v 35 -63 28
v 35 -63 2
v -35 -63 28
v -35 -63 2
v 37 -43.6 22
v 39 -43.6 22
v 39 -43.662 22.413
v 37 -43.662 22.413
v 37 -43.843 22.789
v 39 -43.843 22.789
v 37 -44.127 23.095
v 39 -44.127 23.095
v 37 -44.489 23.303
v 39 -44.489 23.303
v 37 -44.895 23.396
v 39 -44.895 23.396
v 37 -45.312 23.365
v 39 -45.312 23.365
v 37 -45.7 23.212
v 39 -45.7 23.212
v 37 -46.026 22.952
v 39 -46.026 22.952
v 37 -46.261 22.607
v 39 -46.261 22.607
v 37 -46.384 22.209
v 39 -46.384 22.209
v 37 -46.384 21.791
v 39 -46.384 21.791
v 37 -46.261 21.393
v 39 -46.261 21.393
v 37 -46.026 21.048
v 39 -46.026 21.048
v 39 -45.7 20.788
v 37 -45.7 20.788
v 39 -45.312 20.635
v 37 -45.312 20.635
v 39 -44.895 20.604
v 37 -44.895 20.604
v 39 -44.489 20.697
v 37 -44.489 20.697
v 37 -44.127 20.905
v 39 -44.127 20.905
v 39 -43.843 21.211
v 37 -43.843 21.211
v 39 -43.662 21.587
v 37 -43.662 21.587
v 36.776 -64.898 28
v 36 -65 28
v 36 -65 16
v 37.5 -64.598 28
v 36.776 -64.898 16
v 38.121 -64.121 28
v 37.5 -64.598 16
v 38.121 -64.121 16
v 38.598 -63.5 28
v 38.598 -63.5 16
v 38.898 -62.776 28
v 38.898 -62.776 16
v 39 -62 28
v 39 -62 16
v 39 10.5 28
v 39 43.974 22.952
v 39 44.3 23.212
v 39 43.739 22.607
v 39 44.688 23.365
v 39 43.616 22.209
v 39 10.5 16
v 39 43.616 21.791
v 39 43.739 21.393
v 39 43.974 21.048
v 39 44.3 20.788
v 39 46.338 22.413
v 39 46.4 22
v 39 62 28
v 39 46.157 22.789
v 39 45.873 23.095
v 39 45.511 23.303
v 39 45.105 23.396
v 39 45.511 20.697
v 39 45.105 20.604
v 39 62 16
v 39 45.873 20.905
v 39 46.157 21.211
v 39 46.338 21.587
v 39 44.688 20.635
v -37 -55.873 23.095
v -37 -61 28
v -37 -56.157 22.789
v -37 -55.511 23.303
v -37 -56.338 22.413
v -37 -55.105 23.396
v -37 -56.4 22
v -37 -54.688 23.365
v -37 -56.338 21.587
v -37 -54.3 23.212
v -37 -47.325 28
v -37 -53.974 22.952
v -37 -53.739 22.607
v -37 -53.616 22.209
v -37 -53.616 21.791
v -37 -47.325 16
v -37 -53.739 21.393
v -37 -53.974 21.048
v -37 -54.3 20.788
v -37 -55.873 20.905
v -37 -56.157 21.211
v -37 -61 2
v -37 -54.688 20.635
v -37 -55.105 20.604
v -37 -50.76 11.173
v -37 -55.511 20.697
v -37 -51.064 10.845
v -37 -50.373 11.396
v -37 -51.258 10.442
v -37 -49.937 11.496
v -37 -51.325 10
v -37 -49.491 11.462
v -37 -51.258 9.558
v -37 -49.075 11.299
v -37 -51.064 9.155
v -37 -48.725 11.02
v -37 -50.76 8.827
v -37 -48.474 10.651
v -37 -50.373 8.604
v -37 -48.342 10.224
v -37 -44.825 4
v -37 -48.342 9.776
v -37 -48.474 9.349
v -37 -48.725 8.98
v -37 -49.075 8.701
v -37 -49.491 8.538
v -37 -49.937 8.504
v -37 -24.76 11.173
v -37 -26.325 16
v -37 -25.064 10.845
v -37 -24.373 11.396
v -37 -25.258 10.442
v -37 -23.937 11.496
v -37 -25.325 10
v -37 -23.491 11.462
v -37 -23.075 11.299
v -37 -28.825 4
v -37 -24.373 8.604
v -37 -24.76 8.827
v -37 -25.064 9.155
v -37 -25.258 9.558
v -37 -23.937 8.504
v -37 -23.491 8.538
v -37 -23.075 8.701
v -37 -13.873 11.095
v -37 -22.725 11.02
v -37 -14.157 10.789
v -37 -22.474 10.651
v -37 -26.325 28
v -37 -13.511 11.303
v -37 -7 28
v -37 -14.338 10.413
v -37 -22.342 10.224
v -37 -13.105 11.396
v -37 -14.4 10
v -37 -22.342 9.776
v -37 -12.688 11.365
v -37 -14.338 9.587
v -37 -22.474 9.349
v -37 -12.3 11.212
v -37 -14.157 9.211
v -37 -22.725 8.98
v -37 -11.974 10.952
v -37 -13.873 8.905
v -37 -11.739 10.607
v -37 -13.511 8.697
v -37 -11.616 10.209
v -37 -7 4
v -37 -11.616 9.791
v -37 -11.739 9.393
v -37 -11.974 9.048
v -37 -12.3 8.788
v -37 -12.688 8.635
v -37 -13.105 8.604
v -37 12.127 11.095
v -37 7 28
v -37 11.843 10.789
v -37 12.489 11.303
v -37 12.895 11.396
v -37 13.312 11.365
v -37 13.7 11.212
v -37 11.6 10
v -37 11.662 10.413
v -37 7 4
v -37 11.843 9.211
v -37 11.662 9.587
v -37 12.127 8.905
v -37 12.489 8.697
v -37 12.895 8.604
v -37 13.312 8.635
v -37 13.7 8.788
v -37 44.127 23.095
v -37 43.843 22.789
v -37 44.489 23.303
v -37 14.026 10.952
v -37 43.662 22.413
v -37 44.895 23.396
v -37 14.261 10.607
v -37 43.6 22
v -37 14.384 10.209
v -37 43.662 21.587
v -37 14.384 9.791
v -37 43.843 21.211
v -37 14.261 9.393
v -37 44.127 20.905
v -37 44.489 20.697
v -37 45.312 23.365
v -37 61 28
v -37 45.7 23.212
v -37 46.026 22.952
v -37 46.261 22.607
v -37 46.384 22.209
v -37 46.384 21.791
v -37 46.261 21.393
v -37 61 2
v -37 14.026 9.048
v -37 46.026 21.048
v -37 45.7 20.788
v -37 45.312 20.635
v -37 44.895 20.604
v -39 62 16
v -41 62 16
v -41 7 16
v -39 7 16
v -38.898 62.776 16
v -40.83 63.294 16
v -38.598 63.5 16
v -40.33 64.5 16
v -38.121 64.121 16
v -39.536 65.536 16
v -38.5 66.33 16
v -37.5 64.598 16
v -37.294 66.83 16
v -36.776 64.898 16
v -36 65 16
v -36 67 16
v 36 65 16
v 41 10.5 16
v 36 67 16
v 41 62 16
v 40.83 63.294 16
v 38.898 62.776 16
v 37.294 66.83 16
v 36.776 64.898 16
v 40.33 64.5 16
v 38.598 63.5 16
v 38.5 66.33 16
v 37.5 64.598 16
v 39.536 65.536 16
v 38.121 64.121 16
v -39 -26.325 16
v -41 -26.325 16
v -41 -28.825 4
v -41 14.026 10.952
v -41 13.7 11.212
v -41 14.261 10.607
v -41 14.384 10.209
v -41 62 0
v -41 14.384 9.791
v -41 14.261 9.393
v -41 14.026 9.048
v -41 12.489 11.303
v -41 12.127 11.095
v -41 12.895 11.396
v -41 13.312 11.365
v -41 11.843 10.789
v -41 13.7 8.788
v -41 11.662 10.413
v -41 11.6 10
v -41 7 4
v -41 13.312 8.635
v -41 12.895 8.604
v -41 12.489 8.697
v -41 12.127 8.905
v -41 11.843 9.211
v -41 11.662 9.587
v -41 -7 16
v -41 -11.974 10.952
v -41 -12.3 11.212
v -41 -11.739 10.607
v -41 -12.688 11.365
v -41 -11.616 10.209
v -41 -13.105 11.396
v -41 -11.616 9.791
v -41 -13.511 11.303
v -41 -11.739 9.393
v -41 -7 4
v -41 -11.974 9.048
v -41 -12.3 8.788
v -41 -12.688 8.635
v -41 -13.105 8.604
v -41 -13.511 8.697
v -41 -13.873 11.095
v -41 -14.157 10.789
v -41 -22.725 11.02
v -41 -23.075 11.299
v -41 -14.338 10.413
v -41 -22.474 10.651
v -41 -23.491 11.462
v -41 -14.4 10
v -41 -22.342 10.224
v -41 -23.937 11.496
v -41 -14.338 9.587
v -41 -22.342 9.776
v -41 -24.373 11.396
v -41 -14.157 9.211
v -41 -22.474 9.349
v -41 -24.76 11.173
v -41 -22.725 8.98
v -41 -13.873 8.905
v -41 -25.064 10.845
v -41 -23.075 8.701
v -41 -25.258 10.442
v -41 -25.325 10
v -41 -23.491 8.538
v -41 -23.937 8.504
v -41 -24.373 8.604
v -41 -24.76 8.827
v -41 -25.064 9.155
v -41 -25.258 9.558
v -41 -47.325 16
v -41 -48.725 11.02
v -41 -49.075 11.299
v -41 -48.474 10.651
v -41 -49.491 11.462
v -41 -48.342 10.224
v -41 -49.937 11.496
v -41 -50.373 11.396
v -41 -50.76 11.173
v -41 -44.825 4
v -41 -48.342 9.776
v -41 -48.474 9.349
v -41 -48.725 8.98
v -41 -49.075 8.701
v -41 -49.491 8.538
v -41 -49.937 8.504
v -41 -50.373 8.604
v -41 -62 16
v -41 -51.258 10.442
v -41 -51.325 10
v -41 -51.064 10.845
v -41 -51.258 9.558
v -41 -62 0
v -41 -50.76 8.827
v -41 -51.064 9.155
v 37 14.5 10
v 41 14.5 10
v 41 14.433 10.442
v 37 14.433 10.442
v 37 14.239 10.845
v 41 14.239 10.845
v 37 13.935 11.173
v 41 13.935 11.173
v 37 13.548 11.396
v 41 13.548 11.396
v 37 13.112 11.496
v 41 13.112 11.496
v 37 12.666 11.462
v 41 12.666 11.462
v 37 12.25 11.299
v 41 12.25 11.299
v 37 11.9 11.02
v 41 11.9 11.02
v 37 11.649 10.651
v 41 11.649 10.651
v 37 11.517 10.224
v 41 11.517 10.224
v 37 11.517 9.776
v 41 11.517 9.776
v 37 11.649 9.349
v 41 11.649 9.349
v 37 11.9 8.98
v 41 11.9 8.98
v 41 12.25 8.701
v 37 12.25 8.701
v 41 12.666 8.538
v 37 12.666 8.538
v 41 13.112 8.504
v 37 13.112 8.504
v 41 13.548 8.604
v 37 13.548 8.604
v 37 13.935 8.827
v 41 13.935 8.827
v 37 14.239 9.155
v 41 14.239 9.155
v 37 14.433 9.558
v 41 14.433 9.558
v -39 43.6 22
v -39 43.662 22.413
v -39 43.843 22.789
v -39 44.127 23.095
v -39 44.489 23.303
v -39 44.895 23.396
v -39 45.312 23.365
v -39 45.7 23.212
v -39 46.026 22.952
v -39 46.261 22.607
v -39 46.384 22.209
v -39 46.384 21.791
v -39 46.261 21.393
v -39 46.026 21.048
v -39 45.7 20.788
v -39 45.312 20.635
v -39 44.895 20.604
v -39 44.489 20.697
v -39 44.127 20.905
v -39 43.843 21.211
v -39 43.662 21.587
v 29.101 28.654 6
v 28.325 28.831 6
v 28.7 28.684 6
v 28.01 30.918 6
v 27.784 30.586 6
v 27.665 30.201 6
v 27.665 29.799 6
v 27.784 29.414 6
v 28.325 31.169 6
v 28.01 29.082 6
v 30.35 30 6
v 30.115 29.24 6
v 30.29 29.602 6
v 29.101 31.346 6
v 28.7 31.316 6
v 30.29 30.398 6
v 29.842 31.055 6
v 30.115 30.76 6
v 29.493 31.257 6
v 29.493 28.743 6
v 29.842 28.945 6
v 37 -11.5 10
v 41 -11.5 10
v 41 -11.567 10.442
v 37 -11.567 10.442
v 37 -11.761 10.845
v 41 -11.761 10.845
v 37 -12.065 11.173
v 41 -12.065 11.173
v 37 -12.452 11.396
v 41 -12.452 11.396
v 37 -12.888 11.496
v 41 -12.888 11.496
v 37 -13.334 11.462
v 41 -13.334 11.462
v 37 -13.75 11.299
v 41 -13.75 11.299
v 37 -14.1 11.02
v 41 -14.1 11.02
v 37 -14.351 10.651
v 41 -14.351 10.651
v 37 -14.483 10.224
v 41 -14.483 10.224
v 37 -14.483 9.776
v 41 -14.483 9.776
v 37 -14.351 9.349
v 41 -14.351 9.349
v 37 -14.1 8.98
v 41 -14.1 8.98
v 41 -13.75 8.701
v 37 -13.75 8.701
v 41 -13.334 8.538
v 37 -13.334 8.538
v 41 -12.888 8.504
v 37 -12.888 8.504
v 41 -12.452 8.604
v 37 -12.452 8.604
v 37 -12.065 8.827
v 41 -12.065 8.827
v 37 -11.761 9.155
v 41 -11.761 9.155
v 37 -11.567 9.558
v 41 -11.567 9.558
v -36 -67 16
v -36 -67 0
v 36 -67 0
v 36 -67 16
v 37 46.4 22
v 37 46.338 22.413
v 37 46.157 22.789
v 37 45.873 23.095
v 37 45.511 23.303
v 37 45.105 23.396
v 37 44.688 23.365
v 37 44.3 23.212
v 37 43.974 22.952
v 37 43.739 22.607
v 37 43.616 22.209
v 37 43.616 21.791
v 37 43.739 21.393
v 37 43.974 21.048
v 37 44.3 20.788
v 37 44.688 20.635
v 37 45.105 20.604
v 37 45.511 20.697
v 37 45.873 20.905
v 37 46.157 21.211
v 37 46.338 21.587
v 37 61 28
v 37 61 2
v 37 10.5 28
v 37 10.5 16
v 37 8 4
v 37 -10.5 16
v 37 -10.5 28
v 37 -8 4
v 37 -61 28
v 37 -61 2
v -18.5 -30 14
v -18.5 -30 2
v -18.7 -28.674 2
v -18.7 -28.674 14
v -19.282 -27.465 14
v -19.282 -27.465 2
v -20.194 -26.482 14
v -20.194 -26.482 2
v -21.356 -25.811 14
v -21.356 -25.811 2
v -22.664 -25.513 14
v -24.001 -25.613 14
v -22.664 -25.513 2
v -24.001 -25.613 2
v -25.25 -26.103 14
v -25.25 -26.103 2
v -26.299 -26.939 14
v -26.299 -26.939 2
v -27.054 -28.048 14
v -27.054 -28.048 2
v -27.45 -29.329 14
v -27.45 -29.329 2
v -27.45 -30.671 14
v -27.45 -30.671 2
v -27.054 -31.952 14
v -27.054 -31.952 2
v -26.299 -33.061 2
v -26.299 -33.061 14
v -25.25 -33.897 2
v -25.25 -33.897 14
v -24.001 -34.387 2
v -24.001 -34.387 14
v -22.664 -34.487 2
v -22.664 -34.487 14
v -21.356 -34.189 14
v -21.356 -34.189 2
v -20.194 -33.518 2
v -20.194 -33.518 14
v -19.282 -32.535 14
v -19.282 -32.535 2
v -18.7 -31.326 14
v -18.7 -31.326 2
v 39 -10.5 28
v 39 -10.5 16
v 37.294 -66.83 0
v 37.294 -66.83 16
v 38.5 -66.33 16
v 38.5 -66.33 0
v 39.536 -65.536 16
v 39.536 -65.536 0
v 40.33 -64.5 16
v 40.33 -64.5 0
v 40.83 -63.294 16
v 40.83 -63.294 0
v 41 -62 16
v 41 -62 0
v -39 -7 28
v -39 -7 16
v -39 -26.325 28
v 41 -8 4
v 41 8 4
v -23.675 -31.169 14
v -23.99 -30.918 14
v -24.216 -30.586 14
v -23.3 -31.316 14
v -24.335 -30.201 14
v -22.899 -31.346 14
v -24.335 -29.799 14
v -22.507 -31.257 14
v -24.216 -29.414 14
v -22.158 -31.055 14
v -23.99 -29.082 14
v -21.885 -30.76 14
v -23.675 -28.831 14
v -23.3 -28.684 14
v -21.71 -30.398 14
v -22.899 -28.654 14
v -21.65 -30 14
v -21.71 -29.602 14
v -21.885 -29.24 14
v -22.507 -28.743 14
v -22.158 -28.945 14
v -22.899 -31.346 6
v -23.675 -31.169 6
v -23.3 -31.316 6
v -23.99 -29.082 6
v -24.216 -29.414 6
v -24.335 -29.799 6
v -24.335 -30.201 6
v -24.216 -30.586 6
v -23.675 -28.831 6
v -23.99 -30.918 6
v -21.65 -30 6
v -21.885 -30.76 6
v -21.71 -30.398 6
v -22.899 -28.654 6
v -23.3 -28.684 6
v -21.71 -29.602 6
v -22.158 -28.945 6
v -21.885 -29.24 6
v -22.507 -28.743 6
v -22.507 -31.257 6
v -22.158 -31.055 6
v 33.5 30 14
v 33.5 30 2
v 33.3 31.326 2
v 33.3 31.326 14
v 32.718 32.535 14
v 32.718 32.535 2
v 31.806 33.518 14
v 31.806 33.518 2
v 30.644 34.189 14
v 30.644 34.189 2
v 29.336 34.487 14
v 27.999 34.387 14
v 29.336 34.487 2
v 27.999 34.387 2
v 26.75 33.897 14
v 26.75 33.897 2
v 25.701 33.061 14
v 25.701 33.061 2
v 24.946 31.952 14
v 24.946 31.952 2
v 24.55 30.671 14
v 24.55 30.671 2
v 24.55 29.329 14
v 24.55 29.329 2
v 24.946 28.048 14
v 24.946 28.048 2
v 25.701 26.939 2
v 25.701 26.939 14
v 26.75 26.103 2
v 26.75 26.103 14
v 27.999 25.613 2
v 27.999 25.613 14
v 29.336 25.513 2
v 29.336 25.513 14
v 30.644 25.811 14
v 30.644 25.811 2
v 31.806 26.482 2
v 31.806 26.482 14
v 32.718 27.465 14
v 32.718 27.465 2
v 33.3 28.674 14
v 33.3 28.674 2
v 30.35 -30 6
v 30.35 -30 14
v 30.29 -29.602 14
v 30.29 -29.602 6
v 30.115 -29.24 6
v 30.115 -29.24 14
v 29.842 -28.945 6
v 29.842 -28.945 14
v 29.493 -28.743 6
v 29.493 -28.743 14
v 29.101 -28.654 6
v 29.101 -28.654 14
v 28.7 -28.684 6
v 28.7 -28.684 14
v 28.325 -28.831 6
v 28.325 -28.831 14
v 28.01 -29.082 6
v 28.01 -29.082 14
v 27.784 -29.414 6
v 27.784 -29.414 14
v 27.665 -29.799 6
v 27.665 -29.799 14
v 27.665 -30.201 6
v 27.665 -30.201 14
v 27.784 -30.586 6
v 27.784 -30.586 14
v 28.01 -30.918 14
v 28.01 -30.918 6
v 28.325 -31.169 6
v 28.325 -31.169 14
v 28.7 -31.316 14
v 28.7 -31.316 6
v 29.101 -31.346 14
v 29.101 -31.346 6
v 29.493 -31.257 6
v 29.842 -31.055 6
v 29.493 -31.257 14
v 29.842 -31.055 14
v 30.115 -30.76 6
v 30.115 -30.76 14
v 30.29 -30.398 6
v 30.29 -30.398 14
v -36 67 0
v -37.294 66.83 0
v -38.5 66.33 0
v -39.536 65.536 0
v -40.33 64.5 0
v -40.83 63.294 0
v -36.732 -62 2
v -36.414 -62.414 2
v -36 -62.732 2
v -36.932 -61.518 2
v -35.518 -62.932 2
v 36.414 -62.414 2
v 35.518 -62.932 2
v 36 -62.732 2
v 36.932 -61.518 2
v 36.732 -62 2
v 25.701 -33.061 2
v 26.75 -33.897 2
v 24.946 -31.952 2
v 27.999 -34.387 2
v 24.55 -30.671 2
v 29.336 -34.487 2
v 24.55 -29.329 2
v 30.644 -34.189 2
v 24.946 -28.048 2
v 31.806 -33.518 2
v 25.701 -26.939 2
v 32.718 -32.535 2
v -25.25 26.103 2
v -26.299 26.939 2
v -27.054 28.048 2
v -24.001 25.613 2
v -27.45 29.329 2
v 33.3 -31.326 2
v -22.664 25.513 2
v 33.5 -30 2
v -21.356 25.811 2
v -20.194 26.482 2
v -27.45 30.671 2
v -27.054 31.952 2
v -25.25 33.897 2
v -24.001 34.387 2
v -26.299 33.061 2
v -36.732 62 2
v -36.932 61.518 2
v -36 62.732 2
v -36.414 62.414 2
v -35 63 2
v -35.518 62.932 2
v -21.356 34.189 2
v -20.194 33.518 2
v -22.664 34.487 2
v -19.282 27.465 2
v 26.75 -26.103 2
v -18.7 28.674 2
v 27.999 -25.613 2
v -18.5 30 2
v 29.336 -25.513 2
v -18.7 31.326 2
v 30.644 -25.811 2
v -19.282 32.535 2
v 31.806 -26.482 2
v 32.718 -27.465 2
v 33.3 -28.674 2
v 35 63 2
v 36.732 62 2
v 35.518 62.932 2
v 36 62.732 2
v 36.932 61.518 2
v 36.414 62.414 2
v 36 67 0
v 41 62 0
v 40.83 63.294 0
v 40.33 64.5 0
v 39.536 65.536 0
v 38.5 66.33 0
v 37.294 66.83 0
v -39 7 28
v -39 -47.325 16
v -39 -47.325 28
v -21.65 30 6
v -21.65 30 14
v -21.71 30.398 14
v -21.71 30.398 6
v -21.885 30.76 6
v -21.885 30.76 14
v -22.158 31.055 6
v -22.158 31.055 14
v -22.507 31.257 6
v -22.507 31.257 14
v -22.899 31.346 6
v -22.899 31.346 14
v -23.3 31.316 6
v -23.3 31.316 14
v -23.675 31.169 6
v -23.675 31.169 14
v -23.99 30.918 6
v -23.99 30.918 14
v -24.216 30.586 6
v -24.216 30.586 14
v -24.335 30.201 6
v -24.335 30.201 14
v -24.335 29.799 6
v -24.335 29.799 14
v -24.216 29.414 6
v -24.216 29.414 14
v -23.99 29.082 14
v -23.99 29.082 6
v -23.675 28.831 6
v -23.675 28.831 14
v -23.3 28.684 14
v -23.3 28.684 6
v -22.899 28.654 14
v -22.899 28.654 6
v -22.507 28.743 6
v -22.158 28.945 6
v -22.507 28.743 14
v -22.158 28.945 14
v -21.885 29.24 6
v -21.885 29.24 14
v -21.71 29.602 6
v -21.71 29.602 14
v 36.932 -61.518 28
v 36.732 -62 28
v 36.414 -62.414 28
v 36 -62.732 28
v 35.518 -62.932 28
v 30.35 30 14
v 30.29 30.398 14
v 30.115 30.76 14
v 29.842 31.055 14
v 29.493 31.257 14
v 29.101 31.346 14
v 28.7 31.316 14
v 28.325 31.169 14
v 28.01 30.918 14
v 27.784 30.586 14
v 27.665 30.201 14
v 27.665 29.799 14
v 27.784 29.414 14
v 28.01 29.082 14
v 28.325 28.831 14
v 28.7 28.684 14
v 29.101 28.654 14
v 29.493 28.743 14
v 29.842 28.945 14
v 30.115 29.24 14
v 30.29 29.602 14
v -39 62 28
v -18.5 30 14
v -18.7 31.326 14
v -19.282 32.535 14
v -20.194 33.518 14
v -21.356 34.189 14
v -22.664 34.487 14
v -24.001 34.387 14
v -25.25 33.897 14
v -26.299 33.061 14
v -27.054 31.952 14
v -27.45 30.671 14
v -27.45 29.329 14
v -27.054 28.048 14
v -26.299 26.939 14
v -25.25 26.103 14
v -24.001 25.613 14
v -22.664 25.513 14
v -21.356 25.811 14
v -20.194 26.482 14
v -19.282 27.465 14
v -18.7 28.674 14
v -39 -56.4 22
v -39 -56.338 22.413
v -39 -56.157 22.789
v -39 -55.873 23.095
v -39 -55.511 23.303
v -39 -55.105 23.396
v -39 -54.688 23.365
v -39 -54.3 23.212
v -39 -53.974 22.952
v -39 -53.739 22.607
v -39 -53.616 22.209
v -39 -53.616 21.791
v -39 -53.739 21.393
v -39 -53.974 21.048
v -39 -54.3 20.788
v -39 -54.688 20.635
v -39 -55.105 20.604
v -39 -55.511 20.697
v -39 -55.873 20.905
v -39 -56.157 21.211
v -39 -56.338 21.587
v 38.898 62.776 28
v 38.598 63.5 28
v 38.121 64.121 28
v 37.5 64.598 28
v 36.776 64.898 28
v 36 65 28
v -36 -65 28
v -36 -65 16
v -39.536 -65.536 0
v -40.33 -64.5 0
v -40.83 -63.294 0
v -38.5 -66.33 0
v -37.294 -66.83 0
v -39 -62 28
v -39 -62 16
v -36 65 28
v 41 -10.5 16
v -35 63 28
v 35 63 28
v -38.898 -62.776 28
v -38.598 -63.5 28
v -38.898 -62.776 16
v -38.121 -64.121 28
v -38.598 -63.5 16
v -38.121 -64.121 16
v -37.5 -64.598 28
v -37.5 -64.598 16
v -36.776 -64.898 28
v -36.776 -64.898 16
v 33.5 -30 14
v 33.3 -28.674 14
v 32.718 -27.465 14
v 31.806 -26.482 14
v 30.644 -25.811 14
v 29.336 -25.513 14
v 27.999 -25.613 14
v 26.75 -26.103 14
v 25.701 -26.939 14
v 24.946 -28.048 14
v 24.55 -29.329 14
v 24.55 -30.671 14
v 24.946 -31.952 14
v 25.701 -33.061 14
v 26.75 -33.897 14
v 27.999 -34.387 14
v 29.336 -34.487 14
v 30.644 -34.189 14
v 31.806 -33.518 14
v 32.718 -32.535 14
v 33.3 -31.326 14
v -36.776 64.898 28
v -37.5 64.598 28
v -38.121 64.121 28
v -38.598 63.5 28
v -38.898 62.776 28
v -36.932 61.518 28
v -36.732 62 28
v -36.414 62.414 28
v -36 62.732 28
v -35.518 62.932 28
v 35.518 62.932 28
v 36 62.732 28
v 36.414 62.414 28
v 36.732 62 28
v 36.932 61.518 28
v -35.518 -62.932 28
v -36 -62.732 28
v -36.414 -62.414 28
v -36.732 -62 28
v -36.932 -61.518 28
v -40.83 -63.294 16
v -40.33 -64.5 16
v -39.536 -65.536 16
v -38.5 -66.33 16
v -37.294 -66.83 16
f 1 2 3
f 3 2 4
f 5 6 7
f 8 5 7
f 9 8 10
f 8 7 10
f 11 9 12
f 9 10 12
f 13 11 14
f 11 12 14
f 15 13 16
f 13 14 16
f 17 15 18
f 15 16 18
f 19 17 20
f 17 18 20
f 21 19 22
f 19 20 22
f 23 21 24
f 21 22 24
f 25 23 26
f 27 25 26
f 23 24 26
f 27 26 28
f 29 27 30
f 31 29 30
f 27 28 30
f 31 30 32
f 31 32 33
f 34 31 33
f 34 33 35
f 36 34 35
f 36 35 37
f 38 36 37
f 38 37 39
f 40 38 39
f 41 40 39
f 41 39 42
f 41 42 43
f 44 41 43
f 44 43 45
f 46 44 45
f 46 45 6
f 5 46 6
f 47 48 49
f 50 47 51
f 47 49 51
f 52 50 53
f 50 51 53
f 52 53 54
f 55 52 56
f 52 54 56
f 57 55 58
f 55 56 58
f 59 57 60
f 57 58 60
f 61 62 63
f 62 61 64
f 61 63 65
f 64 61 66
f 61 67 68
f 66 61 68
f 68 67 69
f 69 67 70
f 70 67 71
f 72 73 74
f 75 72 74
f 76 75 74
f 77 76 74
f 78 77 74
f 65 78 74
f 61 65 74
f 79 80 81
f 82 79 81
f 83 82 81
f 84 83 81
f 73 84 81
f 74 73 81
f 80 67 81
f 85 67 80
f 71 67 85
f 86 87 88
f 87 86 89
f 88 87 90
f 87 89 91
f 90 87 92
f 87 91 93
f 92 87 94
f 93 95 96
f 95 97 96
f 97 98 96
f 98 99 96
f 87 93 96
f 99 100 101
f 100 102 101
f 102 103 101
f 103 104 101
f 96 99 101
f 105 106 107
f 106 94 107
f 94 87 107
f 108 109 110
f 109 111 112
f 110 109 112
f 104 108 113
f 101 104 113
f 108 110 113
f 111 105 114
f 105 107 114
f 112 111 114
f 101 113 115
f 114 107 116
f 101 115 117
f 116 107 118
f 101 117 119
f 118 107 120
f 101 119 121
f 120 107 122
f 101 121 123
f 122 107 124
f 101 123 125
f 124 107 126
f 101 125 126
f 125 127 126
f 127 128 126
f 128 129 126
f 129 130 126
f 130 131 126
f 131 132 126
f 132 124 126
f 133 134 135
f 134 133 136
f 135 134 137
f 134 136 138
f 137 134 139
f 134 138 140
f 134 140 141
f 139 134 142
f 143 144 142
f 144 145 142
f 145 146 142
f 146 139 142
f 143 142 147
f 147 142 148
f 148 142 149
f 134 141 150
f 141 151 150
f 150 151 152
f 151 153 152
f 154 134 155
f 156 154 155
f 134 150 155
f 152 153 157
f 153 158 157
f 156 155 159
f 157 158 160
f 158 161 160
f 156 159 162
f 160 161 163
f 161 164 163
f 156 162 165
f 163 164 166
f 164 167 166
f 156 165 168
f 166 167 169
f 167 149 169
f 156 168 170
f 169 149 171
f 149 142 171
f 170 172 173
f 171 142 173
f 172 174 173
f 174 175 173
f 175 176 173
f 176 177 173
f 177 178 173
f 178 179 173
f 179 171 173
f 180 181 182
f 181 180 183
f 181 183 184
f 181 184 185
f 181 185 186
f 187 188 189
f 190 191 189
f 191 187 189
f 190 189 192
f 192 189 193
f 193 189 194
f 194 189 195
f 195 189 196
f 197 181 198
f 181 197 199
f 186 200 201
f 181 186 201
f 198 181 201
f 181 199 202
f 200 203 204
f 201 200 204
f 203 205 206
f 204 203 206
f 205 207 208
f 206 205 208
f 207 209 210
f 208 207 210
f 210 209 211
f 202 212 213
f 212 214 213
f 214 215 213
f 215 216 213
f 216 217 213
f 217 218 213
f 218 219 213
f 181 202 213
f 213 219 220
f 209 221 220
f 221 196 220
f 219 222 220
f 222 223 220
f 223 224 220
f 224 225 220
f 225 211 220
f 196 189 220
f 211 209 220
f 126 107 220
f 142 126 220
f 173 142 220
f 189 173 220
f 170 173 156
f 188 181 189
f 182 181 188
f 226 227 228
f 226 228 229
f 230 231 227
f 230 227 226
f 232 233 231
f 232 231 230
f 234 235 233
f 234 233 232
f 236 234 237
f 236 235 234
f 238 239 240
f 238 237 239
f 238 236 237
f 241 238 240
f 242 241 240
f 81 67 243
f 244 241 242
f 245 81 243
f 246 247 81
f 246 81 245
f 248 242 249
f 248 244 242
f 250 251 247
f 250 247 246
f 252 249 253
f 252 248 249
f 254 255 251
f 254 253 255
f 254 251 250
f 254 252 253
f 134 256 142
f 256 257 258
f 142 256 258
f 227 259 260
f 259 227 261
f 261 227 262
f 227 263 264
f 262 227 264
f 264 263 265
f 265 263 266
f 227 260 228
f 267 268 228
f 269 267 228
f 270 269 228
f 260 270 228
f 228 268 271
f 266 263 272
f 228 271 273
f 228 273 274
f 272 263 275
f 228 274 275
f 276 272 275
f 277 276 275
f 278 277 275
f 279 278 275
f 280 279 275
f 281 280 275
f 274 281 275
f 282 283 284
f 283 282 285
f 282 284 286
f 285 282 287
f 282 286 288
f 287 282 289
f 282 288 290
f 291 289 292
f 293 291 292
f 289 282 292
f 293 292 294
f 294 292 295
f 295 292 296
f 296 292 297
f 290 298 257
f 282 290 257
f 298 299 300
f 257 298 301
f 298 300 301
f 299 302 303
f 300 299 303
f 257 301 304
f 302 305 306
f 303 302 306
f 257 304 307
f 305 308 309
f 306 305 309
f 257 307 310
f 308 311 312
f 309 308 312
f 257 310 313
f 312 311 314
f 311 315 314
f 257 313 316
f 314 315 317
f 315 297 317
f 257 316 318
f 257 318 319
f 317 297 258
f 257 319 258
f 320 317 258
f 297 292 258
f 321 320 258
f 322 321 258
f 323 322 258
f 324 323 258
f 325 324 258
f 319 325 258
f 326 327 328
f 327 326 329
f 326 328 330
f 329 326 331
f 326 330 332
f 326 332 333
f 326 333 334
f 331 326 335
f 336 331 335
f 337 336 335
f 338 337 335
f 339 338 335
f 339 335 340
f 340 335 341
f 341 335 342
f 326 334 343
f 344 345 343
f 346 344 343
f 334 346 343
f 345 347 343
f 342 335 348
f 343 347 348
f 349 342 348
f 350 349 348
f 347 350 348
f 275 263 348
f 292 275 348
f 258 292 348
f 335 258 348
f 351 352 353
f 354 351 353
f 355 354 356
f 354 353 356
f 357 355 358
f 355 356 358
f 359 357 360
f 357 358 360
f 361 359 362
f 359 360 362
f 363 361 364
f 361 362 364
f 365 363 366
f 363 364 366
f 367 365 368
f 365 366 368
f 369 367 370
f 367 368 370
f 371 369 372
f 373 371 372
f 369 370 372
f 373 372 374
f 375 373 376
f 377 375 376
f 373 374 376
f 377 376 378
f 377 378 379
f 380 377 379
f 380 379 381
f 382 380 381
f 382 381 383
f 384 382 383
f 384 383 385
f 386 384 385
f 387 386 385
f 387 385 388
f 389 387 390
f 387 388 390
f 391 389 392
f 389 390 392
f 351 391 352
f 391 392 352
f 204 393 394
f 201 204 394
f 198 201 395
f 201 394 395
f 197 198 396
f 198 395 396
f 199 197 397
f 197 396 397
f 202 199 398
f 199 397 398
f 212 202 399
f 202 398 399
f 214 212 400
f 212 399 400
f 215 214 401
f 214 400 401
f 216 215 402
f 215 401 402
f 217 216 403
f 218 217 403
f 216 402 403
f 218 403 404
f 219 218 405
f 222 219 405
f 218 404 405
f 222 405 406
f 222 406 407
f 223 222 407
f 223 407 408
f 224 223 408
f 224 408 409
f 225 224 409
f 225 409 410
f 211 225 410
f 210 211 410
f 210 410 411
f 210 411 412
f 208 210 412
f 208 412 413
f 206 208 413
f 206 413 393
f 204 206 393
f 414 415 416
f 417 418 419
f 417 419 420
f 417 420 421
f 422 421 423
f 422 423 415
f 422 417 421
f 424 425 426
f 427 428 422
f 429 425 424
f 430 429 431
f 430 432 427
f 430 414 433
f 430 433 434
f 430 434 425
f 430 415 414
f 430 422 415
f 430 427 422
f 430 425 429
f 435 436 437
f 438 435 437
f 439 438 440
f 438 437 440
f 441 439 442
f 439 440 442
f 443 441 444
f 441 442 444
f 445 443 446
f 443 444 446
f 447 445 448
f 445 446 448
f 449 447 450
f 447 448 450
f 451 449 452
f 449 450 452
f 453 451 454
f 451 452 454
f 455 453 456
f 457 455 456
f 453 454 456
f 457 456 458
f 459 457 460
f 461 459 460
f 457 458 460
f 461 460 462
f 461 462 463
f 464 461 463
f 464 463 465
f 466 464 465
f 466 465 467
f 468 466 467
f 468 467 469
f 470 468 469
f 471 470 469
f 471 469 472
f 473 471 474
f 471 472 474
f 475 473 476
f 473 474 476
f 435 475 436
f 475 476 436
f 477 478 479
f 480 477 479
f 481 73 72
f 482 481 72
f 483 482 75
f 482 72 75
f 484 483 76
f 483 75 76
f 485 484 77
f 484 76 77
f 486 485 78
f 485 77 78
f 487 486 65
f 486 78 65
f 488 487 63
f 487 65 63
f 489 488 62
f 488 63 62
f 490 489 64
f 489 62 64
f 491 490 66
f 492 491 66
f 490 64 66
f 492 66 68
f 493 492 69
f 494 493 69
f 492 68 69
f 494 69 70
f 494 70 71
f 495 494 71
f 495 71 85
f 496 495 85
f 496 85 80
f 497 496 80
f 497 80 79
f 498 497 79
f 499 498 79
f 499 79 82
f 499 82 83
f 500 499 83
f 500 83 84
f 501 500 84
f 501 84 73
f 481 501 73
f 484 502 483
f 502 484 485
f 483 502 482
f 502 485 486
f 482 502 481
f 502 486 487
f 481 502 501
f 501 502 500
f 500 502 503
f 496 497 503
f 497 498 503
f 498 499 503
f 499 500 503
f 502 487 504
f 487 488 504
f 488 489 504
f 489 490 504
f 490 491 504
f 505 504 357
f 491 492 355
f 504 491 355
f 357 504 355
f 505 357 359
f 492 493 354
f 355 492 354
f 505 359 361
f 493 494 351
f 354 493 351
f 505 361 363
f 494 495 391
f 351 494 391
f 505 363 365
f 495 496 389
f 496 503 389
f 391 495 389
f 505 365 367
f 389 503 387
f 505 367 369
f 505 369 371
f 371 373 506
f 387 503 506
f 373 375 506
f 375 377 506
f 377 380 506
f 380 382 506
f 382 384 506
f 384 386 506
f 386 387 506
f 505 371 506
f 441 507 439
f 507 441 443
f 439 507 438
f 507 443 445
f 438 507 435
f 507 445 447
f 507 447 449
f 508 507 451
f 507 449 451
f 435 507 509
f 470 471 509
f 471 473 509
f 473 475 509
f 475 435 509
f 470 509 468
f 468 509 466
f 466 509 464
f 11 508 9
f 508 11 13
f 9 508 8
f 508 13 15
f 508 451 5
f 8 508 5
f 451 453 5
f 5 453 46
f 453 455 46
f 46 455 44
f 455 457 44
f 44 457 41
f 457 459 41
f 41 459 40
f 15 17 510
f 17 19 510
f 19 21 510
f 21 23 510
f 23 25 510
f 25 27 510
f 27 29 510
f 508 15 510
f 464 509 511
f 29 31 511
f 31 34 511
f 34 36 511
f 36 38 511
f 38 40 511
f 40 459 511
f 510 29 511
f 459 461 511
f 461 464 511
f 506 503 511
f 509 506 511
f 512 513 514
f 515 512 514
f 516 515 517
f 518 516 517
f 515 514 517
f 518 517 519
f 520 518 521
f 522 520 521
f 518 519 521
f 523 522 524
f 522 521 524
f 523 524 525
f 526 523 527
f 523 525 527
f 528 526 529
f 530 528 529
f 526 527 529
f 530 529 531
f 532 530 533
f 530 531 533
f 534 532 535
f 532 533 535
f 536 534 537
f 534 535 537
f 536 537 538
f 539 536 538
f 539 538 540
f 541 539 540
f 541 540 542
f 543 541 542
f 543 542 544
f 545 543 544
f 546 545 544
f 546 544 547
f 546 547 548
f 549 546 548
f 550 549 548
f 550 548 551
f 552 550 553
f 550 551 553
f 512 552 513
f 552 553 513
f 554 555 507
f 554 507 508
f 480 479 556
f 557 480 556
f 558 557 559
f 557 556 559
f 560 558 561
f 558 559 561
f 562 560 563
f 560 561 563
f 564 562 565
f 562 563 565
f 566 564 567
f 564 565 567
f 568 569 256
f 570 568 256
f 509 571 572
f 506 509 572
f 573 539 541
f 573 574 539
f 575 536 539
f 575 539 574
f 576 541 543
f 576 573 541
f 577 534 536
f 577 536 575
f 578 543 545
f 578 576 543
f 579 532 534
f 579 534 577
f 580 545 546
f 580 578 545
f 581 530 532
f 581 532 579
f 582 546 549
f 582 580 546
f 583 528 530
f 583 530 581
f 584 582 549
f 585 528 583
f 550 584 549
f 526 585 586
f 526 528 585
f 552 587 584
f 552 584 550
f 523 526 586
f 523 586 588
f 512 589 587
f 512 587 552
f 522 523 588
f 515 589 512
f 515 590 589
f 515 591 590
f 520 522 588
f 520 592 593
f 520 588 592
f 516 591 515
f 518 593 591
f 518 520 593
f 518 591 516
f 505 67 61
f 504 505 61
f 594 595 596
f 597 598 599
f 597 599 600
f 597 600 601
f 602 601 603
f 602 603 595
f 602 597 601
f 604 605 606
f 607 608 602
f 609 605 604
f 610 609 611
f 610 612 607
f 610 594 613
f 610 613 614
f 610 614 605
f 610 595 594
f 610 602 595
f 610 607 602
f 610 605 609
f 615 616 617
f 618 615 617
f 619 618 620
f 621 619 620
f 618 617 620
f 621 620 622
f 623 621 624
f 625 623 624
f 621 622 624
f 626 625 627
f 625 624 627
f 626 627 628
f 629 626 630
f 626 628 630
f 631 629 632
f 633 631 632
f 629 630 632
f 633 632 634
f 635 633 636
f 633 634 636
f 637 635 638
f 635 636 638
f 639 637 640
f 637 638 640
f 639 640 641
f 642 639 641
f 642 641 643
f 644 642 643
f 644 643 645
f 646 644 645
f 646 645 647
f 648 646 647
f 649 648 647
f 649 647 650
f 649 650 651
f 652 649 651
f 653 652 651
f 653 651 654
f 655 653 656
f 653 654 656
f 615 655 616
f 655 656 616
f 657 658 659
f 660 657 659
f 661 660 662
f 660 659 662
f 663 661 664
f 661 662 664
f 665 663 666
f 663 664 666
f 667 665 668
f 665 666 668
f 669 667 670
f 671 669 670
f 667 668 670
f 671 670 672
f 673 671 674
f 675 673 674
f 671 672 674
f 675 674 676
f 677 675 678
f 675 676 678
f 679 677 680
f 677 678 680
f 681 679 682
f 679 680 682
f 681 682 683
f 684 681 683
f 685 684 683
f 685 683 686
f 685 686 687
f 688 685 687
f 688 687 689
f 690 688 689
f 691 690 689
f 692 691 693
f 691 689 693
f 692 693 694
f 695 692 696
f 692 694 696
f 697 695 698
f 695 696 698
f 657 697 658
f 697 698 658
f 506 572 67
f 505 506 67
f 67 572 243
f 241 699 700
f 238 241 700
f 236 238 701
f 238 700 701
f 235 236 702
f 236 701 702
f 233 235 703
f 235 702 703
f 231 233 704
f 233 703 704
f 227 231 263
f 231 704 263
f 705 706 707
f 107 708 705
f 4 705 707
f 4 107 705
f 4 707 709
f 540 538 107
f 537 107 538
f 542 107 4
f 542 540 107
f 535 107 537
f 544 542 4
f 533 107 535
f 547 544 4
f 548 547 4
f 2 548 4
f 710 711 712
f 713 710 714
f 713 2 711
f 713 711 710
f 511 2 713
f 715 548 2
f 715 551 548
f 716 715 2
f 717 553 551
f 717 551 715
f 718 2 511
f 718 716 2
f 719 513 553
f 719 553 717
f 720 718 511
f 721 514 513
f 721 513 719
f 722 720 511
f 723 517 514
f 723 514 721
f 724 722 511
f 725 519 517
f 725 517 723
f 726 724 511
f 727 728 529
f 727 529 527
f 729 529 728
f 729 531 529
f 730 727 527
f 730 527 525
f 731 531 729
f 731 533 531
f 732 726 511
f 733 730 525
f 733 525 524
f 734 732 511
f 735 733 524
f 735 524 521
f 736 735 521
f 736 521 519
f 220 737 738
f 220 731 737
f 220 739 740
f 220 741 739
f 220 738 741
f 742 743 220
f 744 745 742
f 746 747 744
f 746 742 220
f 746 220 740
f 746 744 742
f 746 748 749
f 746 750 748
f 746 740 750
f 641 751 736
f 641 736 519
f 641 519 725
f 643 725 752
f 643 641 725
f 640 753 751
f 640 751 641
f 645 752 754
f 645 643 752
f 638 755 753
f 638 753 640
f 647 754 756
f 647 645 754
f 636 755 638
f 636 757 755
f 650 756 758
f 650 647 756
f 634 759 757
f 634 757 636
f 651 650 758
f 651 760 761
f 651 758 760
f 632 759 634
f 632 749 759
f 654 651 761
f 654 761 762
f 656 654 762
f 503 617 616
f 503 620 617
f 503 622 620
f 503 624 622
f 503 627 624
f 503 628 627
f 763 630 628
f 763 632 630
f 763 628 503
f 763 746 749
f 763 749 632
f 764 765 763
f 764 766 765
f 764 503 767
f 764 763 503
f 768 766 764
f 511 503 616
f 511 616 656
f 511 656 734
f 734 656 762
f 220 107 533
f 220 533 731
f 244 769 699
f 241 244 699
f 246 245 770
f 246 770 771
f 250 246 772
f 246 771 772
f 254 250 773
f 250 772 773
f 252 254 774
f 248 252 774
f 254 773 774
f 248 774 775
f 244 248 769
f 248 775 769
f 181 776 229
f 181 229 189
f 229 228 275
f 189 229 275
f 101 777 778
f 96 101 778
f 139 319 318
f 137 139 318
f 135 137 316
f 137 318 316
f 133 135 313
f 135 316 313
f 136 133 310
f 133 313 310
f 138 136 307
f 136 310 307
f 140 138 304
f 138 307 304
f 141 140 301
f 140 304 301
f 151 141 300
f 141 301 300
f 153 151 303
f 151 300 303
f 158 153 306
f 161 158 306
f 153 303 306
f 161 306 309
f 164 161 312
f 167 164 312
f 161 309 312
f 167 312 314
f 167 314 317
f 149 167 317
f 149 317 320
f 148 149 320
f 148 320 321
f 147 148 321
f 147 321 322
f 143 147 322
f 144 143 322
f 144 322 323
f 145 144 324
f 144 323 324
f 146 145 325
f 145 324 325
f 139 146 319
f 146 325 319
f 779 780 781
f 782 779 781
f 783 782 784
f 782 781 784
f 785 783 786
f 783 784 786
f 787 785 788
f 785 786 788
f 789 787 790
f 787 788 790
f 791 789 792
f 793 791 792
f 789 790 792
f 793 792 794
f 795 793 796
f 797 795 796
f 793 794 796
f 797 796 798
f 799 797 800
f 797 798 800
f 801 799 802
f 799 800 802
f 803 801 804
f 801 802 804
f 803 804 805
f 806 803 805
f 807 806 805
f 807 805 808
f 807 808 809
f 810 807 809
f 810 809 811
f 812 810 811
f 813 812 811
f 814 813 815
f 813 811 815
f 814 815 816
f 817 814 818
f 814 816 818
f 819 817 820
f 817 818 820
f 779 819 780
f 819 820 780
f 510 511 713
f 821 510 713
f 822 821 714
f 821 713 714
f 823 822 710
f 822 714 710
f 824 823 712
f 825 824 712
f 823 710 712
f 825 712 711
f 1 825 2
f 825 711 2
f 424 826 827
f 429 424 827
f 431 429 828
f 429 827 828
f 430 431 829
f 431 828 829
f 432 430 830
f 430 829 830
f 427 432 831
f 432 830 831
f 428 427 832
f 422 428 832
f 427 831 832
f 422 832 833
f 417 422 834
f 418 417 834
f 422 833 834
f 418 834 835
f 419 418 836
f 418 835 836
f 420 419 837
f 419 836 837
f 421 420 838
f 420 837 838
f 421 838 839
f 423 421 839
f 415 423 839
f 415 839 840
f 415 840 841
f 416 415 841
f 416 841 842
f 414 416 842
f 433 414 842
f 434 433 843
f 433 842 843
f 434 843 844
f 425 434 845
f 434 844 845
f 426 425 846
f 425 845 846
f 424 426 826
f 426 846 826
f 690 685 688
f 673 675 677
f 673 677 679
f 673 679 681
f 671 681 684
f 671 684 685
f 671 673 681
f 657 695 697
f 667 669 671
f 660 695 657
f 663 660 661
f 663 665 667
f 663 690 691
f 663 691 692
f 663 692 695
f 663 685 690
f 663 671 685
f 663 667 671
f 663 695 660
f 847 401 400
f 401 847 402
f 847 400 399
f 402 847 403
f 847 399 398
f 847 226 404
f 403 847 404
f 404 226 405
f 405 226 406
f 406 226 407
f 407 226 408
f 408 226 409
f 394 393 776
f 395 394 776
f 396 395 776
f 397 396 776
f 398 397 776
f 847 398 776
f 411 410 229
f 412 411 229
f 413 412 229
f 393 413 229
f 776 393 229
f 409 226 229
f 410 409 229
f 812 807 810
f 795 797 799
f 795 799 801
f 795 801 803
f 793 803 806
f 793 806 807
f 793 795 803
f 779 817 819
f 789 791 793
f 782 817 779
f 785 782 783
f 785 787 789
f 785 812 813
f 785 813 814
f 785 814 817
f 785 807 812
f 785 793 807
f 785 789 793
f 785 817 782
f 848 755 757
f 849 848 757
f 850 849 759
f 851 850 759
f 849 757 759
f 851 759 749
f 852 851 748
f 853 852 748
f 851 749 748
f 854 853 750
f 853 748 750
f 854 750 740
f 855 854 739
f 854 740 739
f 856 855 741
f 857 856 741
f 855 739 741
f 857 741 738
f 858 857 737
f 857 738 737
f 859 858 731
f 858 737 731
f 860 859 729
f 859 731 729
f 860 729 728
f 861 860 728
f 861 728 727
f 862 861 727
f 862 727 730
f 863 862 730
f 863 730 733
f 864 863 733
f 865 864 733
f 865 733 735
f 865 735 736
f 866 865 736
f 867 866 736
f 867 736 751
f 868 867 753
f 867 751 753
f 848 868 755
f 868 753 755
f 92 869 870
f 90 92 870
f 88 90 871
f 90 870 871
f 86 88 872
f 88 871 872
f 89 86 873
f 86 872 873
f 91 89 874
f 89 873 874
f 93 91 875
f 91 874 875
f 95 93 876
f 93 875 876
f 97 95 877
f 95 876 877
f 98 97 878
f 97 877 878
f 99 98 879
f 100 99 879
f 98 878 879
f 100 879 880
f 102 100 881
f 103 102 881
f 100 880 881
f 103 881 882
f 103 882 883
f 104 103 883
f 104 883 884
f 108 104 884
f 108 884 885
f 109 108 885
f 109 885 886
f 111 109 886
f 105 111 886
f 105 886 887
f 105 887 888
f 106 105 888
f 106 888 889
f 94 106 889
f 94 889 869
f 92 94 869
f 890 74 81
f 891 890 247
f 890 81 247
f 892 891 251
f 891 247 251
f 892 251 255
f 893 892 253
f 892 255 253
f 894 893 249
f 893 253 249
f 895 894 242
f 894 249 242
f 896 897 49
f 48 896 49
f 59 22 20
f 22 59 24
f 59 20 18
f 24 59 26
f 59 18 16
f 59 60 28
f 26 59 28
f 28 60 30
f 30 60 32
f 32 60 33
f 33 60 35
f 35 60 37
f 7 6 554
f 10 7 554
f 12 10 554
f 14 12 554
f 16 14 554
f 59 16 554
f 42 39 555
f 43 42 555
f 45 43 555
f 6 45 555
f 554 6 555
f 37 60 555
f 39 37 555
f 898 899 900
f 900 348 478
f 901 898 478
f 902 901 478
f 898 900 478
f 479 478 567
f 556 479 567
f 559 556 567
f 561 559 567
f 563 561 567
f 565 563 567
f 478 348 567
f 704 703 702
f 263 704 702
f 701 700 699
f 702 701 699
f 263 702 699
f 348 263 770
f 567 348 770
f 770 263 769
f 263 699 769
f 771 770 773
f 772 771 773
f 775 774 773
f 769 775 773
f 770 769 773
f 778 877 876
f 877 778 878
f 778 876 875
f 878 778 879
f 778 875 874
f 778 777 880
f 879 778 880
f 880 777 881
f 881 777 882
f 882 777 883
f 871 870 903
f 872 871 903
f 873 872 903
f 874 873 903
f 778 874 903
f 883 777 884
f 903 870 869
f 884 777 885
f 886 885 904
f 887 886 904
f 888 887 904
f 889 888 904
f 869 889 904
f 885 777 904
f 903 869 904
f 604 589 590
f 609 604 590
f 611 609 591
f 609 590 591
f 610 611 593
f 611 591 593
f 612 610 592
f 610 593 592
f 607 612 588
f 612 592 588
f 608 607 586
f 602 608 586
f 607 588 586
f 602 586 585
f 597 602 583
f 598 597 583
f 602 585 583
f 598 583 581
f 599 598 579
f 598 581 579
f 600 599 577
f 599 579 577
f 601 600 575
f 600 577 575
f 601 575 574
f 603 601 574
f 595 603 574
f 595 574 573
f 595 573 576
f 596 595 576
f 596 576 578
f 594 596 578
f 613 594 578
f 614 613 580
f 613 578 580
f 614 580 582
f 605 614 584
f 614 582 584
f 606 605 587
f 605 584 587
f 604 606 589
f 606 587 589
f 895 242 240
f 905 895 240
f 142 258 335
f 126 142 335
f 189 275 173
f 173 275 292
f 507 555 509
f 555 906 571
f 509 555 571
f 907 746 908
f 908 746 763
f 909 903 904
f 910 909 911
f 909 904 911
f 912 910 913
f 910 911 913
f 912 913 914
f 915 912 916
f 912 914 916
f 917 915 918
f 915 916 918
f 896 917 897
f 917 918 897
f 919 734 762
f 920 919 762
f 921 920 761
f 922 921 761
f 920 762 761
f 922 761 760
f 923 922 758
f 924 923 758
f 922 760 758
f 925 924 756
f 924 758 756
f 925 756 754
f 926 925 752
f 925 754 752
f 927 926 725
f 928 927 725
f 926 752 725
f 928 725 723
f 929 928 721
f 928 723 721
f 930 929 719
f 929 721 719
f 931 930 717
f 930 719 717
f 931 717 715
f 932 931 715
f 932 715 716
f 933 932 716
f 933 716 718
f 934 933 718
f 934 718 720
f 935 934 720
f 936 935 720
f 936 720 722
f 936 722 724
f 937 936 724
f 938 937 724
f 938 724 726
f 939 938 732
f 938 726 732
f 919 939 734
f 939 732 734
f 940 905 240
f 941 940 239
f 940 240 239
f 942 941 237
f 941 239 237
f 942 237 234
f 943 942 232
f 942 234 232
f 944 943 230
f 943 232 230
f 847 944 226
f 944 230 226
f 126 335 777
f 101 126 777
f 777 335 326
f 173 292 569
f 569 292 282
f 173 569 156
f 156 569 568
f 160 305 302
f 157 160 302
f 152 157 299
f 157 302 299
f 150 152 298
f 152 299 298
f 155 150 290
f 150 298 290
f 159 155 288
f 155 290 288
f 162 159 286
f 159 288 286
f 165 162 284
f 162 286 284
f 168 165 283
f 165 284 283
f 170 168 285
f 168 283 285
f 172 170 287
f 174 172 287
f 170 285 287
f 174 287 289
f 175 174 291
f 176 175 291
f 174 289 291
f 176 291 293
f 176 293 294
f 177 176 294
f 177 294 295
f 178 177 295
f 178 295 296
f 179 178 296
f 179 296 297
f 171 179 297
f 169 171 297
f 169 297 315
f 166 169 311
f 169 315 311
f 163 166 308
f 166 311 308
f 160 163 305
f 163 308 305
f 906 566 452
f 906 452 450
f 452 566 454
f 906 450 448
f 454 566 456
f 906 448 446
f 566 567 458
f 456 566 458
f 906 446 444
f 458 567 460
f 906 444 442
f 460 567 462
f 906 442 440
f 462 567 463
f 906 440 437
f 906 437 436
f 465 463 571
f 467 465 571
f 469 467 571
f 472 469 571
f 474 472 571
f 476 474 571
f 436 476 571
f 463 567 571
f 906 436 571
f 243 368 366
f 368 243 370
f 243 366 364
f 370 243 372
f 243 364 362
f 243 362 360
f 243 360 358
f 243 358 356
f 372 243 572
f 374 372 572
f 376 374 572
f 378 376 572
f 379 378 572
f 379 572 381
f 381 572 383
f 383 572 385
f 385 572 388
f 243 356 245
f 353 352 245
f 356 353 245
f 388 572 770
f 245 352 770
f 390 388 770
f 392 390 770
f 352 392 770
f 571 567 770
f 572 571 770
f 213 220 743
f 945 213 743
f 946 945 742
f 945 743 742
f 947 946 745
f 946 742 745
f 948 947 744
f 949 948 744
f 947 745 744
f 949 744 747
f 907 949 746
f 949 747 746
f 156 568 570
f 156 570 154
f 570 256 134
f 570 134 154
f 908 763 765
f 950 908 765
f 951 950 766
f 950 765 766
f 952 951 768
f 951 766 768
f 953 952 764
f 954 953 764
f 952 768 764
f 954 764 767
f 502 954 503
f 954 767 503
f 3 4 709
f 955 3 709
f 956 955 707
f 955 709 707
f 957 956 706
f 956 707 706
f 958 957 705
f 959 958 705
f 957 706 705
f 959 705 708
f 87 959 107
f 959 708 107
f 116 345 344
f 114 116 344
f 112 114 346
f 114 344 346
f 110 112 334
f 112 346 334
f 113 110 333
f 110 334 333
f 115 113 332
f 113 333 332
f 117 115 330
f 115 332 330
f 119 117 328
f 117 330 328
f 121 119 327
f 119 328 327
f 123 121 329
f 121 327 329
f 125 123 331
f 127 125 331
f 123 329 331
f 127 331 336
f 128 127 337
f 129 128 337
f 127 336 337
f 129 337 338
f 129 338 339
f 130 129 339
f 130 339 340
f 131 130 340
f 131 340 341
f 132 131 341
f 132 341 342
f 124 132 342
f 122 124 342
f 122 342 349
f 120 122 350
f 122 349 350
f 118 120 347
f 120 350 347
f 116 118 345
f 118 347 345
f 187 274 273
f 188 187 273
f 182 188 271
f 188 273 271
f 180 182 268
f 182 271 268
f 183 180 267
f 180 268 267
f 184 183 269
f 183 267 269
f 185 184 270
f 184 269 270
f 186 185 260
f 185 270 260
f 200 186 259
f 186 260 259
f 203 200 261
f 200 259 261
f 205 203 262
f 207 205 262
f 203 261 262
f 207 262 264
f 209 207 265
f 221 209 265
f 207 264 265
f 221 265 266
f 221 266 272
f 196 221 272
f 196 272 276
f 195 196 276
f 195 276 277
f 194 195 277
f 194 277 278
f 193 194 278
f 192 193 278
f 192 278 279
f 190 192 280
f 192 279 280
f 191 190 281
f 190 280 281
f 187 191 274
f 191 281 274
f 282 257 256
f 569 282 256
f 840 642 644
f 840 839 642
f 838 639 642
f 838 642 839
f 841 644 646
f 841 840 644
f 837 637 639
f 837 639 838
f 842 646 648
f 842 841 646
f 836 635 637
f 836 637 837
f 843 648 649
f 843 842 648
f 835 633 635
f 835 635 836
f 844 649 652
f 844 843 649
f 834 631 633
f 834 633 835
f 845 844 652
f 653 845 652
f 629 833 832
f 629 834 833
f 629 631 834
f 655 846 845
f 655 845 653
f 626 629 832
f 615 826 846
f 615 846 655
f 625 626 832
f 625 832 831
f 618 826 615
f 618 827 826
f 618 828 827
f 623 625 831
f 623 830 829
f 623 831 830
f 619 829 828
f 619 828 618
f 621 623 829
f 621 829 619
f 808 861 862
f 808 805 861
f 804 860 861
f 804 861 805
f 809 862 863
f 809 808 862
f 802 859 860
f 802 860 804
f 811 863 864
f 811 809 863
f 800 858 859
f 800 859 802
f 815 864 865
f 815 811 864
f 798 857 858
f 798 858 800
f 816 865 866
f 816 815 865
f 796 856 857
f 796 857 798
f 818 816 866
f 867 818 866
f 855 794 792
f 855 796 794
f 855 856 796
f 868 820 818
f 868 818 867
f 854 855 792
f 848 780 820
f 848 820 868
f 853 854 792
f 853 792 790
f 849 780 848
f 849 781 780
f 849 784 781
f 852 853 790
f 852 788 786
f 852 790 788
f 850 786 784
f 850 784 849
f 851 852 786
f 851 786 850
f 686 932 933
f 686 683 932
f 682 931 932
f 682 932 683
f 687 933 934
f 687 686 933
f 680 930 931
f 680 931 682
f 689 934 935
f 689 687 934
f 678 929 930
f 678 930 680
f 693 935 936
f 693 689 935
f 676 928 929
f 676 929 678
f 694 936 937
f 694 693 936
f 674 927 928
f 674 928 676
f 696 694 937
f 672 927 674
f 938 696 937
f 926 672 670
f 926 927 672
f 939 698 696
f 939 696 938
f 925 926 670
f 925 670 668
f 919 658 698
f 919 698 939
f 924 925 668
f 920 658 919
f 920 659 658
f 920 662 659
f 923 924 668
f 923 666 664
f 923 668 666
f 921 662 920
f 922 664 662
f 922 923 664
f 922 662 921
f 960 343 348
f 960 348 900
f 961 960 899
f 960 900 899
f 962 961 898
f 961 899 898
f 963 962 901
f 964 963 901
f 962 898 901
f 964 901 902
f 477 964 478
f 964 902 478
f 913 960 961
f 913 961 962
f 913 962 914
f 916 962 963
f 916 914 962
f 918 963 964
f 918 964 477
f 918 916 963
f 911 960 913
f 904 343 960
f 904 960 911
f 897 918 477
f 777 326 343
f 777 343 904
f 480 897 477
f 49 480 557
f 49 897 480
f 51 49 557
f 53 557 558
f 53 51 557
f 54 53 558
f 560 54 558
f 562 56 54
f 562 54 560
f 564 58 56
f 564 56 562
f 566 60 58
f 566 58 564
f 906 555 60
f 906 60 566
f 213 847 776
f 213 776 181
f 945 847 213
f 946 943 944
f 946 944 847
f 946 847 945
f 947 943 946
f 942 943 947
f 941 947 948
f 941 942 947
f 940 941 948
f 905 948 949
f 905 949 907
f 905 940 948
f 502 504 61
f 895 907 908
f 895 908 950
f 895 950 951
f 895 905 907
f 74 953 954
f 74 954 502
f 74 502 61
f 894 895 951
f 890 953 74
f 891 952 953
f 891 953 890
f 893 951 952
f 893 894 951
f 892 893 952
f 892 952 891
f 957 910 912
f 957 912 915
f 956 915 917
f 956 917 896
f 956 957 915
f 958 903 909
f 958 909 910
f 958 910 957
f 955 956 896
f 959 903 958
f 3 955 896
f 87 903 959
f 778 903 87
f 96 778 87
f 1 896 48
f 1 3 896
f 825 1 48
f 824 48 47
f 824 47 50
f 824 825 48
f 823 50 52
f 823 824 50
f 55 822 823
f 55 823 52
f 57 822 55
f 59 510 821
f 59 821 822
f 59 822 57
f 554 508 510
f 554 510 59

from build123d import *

# Parameters (mm, degrees)
F1_DEPTH  = 16
F2_T      = -2
F3_R      = 4.5
F4_DEPTH  = 12
F6_R      = 1.35
F7_DEPTH  = 8
F8_DEPTH  = 26
F9_R      = 1.4
F9_W      = 14
F9_H      = 12
F9_R_2    = 1.5
F9_W_2    = 21
F11_DEPTH = 4
F10_R     = 1.5
F10_W     = 21
F10_H     = 12
F10_R_2   = 1.4
F12_DEPTH = 4


with BuildPart() as f1:
    # F0 (on Top) → F1 (new body)
    with BuildSketch(Plane.XY):
        with BuildLine():
            Line((-36, -67), (36, -67))
            ThreePointArc((36, -67), (39.5355339059, -65.5355339059), (41, -62))
            Line((41, -62), (41, 62))
            ThreePointArc((41, 62), (39.5355339059, 65.5355339059), (36, 67))
            Line((36, 67), (-36, 67))
            ThreePointArc((-36, 67), (-39.5355339059, 65.5355339059), (-41, 62))
            Line((-41, 62), (-41, -62))
            ThreePointArc((-41, -62), (-39.5355339059, -65.5355339059), (-36, -67))
        make_face()
    extrude(amount=F1_DEPTH)

    # F2
    f2_openings = [f1.faces().sort_by_distance(p)[0] for p in [
        (0, 0, 16),
    ]]
    offset(amount=F2_T, openings=f2_openings)

    # F3 (on face) → F4 (join)
    with BuildSketch(Plane.XY.offset(2)):
        with Locations((-23, 30)):
            Circle(F3_R)
        with Locations((-23, -30)):
            Circle(F3_R)
        with Locations((29, -30)):
            Circle(F3_R)
        with Locations((29, 30)):
            Circle(F3_R)
    extrude(amount=F4_DEPTH)

    # F6 (on mid) → F7 (cut)
    with BuildSketch(Plane.XY.offset(14)):
        with Locations((-23, 30)):
            Circle(F6_R)
        with Locations((29, 30)):
            Circle(F6_R)
        with Locations((-23, -30)):
            Circle(F6_R)
        with Locations((29, -30)):
            Circle(F6_R)
    extrude(amount=-F7_DEPTH, mode=Mode.SUBTRACT)

    # F3 (on face) → F8 (join)
    with BuildSketch(Plane.XY.offset(2)):
        with BuildLine():
            Line((-36, -65), (36, -65))
            ThreePointArc((36, -65), (38.1213203436, -64.1213203436), (39, -62))
            Line((39, -62), (39, 62))
            ThreePointArc((39, 62), (38.1213203436, 64.1213203436), (36, 65))
            Line((36, 65), (-36, 65))
            ThreePointArc((-36, 65), (-38.1213203436, 64.1213203436), (-39, 62))
            Line((-39, 62), (-39, -62))
            ThreePointArc((-39, -62), (-38.1213203436, -64.1213203436), (-36, -65))
        make_face()
        with BuildLine():
            ThreePointArc((37, -61), (36.4142135624, -62.4142135624), (35, -63))
            Line((35, -63), (-35, -63))
            ThreePointArc((-35, -63), (-36.4142135624, -62.4142135624), (-37, -61))
            Line((-37, -61), (-37, 61))
            ThreePointArc((-37, 61), (-36.4142135624, 62.4142135624), (-35, 63))
            Line((-35, 63), (35, 63))
            ThreePointArc((35, 63), (36.4142135624, 62.4142135624), (37, 61))
            Line((37, 61), (37, -61))
        make_face(mode=Mode.SUBTRACT)
    extrude(amount=F8_DEPTH)

    # F9 (on face) → F11 (cut)
    with BuildSketch(Plane(origin=(-41, 0, 0), x_dir=(0, -1, 0), z_dir=(-1, 0, 0))):
        with Locations((-13, 10)):
            Circle(F9_R)
        with Locations((13, 10)):
            Circle(F9_R)
        with Locations((0, 10)):
            Rectangle(F9_W, F9_H)
        with Locations((0, 22)):
            Rectangle(F9_W, F9_H)
        with Locations((23.825, 10)):
            Circle(F9_R_2)
        with Locations((49.825, 10)):
            Circle(F9_R_2)
        with Locations((36.825, 22)):
            Rectangle(F9_W_2, F9_H)
        Polygon((47.325, 16), (26.325, 16), (28.825, 4), (44.825, 4), align=None)
        with Locations((-45, 22)):
            Circle(F9_R)
        with Locations((55, 22)):
            Circle(F9_R)
    extrude(amount=-F11_DEPTH, mode=Mode.SUBTRACT)

    # F10 (on face) → F12 (cut)
    with BuildSketch(Plane.YZ.offset(41)):
        with Locations((-13, 10)):
            Circle(F10_R)
        with Locations((13, 10)):
            Circle(F10_R)
        with Locations((0, 22)):
            Rectangle(F10_W, F10_H)
        Polygon((10.5, 16), (-10.5, 16), (-8, 4), (8, 4), align=None)
        with Locations((45, 22)):
            Circle(F10_R_2)
        with Locations((-45, 22)):
            Circle(F10_R_2)
    extrude(amount=-F12_DEPTH, mode=Mode.SUBTRACT)


solid = f1.part
